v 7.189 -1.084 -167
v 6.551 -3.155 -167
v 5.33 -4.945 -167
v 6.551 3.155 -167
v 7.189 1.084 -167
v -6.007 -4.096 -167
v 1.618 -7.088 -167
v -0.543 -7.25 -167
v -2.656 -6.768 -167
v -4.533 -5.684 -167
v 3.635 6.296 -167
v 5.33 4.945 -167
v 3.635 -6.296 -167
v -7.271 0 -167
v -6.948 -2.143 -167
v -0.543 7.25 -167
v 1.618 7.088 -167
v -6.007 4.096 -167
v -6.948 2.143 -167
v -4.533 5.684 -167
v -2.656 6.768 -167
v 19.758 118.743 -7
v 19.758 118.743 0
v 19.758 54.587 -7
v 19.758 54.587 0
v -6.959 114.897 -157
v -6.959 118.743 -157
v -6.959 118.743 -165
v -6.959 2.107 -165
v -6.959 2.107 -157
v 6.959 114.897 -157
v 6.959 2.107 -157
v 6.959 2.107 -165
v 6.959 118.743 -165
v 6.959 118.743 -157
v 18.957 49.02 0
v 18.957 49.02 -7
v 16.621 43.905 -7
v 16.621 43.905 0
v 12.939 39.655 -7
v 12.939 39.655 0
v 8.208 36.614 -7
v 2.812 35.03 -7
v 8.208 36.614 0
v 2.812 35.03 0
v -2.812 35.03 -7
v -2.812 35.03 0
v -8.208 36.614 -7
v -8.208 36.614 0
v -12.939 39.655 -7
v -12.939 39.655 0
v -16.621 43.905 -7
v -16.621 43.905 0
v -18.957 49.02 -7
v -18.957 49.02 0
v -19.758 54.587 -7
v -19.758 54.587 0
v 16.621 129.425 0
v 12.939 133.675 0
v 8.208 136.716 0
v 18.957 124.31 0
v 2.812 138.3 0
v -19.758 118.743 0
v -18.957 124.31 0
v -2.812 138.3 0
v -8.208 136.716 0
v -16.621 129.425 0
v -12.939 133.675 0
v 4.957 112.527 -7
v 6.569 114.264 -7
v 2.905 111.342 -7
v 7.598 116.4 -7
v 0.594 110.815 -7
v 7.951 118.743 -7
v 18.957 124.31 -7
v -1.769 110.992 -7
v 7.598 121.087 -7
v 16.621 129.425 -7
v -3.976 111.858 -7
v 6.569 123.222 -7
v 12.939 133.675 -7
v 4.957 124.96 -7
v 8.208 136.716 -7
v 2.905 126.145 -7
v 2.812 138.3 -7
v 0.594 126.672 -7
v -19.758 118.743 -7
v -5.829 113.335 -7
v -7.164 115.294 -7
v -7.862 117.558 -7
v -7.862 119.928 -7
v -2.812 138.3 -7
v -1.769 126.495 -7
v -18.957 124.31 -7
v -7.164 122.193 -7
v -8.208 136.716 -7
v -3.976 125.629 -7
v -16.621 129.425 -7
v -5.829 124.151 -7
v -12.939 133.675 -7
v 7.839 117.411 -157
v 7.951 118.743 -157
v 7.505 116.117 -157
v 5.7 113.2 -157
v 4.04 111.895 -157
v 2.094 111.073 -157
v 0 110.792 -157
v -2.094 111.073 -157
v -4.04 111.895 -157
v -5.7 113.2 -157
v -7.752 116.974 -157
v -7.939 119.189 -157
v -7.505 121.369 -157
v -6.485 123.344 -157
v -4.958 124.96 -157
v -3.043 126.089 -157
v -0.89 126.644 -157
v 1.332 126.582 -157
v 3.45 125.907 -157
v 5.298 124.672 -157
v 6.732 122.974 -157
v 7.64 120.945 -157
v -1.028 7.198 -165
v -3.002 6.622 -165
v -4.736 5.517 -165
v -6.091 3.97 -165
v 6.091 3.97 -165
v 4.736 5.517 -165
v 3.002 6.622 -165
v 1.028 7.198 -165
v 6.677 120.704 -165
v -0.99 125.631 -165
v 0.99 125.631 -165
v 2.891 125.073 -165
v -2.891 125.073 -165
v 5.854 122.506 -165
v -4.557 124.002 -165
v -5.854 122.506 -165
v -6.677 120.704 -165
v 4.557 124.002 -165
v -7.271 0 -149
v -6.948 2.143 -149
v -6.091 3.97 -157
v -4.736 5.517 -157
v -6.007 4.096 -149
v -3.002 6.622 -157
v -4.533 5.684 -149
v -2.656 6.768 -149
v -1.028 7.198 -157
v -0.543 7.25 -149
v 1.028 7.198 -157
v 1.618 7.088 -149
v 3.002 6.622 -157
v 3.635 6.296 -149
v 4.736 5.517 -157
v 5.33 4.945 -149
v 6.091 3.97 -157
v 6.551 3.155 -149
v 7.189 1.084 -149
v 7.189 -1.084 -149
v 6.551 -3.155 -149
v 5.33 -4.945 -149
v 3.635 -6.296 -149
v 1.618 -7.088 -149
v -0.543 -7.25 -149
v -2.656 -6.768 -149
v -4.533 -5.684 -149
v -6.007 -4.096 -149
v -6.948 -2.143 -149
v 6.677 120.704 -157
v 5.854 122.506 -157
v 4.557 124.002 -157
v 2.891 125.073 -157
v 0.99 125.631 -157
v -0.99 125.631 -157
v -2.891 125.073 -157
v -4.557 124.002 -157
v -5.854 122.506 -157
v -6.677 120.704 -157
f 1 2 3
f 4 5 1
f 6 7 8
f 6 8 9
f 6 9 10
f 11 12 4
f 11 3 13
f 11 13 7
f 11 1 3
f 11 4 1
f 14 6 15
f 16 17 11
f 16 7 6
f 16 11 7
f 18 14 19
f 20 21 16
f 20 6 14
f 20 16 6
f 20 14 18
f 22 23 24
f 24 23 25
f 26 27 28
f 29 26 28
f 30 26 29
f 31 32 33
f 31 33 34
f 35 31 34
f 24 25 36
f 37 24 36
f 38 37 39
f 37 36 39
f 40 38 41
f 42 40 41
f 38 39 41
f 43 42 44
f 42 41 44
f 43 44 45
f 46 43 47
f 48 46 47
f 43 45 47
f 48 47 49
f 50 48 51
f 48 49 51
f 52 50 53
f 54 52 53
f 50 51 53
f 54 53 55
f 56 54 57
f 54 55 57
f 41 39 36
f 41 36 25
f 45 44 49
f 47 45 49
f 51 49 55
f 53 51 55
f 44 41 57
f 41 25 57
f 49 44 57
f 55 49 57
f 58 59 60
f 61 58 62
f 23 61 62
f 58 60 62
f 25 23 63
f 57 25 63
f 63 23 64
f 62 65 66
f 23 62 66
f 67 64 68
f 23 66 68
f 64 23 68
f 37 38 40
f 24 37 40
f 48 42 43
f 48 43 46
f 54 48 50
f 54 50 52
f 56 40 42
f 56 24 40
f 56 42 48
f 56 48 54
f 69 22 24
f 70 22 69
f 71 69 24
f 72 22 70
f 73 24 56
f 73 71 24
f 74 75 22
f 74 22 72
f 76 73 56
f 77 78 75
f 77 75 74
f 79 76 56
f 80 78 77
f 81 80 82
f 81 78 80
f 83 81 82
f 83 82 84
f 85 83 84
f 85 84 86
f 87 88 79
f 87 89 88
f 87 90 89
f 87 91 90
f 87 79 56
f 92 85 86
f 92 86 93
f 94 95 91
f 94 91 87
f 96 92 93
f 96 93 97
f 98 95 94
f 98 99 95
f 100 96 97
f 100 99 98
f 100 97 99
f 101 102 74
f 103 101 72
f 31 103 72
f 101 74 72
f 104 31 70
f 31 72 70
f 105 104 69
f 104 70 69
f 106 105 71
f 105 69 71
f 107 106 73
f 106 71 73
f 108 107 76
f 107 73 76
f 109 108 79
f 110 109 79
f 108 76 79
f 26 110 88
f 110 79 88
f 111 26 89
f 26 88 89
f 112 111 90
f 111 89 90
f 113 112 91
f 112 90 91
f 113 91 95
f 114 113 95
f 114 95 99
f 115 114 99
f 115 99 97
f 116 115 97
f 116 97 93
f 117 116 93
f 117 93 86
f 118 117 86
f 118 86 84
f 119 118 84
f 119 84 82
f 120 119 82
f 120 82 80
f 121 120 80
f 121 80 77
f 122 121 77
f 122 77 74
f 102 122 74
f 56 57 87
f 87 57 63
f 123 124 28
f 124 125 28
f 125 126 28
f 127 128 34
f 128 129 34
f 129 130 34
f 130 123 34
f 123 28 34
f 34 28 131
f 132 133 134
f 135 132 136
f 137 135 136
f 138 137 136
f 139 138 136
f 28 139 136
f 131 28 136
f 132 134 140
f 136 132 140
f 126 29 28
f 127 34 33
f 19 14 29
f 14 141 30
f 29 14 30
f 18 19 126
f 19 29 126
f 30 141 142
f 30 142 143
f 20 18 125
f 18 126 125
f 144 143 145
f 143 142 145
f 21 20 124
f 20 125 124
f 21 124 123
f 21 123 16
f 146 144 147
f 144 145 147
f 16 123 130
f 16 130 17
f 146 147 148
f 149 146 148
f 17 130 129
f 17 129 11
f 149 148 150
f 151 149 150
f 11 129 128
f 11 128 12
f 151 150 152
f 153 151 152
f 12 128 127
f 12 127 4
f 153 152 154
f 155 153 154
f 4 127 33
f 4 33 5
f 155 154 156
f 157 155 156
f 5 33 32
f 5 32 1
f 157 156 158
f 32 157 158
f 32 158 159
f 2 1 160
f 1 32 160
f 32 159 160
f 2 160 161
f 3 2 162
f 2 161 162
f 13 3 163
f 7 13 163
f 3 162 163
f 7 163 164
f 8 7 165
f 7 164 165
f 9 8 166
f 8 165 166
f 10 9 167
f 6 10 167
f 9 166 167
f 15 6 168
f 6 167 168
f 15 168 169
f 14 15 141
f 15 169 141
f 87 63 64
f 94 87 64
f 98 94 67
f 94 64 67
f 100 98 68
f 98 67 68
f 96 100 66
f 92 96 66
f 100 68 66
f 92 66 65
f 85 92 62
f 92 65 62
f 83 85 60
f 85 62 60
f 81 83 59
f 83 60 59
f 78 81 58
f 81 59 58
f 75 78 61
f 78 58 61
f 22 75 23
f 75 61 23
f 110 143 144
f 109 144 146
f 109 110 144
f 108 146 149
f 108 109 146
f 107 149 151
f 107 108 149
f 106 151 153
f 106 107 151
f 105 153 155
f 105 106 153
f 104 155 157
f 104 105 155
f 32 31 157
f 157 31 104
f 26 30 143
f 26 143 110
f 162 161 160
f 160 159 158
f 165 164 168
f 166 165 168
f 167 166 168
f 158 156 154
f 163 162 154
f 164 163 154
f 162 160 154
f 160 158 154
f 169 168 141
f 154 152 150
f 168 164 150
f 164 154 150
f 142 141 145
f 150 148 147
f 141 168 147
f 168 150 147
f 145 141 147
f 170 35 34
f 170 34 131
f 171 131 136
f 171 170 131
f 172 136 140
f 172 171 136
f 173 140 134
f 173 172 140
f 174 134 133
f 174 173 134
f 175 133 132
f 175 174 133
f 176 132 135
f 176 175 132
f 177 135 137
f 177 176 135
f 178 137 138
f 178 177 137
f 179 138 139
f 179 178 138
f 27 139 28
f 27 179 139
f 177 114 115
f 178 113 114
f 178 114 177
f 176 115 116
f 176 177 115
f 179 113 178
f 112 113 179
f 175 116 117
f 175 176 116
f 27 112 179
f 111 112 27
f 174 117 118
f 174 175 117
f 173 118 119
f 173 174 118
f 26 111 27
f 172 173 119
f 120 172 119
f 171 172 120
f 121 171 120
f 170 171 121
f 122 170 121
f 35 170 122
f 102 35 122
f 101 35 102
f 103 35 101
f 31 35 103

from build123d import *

# Parameters (mm, degrees)
EXTRUDE_1_DEPTH      = 7
SKETCH_3_R           = 7.951035335
EXTRUDE_2_DEPTH      = 150
EXTRUDE_3_DEPTH      = 8
EXTRUDE_4_DEPTH      = 2
EXTRUDE_4_DEPTH_BACK = 16
SKETCH_5_R           = 7.270551731


with BuildPart() as part:
    # 草图1 → 凸台-拉伸1 (new body)
    with BuildSketch(Plane.XY):
        with BuildLine():
            Line((-19.757797481, 54.586532616), (-19.757797481, 118.7433895))
            ThreePointArc((-19.757797481, 118.7433895), (0, 138.50118698), (19.757797481, 118.7433895))
            Line((19.757797481, 118.7433895), (19.757797481, 54.586532616))
            ThreePointArc((19.757797481, 54.586532616), (0, 34.828735136), (-19.757797481, 54.586532616))
        make_face()
    extrude(amount=-EXTRUDE_1_DEPTH)

    # 草图3 → 凸台-拉伸2 (add)
    with BuildSketch(Plane(origin=(0, 0, -7), x_dir=(-1, 0, 0), z_dir=(0, 0, -1))):
        with Locations(Location((0, 118.7433895, 0), (0, 0, 180))):
            Circle(SKETCH_3_R)
    extrude(amount=EXTRUDE_2_DEPTH)

    # 草图4 → 凸台-拉伸3 (add)
    with BuildSketch(Plane(origin=(0, 0, -157), x_dir=(-1, 0, 0), z_dir=(0, 0, -1))):
        with BuildLine():
            Line((6.958683776, 118.7433895), (6.958683776, 0))
            ThreePointArc((6.958683776, 0), (0, -6.958683776), (-6.958683776, 0))
            Line((-6.958683776, 0), (-6.958683776, 118.7433895))
            ThreePointArc((-6.958683776, 118.7433895), (0, 125.702073275), (6.958683776, 118.7433895))
        make_face()
    extrude(amount=EXTRUDE_3_DEPTH)

    # 草图5 → 凸台-拉伸4 (add, two sides: drawn at the far end of the back side and taken through both)
    with BuildSketch(Plane(origin=(0, 0, -165), x_dir=(-1, 0, 0), z_dir=(0, 0, -1)).offset(-EXTRUDE_4_DEPTH_BACK)):
        Circle(SKETCH_5_R)
    extrude(amount=EXTRUDE_4_DEPTH + EXTRUDE_4_DEPTH_BACK)


solid = part.part
